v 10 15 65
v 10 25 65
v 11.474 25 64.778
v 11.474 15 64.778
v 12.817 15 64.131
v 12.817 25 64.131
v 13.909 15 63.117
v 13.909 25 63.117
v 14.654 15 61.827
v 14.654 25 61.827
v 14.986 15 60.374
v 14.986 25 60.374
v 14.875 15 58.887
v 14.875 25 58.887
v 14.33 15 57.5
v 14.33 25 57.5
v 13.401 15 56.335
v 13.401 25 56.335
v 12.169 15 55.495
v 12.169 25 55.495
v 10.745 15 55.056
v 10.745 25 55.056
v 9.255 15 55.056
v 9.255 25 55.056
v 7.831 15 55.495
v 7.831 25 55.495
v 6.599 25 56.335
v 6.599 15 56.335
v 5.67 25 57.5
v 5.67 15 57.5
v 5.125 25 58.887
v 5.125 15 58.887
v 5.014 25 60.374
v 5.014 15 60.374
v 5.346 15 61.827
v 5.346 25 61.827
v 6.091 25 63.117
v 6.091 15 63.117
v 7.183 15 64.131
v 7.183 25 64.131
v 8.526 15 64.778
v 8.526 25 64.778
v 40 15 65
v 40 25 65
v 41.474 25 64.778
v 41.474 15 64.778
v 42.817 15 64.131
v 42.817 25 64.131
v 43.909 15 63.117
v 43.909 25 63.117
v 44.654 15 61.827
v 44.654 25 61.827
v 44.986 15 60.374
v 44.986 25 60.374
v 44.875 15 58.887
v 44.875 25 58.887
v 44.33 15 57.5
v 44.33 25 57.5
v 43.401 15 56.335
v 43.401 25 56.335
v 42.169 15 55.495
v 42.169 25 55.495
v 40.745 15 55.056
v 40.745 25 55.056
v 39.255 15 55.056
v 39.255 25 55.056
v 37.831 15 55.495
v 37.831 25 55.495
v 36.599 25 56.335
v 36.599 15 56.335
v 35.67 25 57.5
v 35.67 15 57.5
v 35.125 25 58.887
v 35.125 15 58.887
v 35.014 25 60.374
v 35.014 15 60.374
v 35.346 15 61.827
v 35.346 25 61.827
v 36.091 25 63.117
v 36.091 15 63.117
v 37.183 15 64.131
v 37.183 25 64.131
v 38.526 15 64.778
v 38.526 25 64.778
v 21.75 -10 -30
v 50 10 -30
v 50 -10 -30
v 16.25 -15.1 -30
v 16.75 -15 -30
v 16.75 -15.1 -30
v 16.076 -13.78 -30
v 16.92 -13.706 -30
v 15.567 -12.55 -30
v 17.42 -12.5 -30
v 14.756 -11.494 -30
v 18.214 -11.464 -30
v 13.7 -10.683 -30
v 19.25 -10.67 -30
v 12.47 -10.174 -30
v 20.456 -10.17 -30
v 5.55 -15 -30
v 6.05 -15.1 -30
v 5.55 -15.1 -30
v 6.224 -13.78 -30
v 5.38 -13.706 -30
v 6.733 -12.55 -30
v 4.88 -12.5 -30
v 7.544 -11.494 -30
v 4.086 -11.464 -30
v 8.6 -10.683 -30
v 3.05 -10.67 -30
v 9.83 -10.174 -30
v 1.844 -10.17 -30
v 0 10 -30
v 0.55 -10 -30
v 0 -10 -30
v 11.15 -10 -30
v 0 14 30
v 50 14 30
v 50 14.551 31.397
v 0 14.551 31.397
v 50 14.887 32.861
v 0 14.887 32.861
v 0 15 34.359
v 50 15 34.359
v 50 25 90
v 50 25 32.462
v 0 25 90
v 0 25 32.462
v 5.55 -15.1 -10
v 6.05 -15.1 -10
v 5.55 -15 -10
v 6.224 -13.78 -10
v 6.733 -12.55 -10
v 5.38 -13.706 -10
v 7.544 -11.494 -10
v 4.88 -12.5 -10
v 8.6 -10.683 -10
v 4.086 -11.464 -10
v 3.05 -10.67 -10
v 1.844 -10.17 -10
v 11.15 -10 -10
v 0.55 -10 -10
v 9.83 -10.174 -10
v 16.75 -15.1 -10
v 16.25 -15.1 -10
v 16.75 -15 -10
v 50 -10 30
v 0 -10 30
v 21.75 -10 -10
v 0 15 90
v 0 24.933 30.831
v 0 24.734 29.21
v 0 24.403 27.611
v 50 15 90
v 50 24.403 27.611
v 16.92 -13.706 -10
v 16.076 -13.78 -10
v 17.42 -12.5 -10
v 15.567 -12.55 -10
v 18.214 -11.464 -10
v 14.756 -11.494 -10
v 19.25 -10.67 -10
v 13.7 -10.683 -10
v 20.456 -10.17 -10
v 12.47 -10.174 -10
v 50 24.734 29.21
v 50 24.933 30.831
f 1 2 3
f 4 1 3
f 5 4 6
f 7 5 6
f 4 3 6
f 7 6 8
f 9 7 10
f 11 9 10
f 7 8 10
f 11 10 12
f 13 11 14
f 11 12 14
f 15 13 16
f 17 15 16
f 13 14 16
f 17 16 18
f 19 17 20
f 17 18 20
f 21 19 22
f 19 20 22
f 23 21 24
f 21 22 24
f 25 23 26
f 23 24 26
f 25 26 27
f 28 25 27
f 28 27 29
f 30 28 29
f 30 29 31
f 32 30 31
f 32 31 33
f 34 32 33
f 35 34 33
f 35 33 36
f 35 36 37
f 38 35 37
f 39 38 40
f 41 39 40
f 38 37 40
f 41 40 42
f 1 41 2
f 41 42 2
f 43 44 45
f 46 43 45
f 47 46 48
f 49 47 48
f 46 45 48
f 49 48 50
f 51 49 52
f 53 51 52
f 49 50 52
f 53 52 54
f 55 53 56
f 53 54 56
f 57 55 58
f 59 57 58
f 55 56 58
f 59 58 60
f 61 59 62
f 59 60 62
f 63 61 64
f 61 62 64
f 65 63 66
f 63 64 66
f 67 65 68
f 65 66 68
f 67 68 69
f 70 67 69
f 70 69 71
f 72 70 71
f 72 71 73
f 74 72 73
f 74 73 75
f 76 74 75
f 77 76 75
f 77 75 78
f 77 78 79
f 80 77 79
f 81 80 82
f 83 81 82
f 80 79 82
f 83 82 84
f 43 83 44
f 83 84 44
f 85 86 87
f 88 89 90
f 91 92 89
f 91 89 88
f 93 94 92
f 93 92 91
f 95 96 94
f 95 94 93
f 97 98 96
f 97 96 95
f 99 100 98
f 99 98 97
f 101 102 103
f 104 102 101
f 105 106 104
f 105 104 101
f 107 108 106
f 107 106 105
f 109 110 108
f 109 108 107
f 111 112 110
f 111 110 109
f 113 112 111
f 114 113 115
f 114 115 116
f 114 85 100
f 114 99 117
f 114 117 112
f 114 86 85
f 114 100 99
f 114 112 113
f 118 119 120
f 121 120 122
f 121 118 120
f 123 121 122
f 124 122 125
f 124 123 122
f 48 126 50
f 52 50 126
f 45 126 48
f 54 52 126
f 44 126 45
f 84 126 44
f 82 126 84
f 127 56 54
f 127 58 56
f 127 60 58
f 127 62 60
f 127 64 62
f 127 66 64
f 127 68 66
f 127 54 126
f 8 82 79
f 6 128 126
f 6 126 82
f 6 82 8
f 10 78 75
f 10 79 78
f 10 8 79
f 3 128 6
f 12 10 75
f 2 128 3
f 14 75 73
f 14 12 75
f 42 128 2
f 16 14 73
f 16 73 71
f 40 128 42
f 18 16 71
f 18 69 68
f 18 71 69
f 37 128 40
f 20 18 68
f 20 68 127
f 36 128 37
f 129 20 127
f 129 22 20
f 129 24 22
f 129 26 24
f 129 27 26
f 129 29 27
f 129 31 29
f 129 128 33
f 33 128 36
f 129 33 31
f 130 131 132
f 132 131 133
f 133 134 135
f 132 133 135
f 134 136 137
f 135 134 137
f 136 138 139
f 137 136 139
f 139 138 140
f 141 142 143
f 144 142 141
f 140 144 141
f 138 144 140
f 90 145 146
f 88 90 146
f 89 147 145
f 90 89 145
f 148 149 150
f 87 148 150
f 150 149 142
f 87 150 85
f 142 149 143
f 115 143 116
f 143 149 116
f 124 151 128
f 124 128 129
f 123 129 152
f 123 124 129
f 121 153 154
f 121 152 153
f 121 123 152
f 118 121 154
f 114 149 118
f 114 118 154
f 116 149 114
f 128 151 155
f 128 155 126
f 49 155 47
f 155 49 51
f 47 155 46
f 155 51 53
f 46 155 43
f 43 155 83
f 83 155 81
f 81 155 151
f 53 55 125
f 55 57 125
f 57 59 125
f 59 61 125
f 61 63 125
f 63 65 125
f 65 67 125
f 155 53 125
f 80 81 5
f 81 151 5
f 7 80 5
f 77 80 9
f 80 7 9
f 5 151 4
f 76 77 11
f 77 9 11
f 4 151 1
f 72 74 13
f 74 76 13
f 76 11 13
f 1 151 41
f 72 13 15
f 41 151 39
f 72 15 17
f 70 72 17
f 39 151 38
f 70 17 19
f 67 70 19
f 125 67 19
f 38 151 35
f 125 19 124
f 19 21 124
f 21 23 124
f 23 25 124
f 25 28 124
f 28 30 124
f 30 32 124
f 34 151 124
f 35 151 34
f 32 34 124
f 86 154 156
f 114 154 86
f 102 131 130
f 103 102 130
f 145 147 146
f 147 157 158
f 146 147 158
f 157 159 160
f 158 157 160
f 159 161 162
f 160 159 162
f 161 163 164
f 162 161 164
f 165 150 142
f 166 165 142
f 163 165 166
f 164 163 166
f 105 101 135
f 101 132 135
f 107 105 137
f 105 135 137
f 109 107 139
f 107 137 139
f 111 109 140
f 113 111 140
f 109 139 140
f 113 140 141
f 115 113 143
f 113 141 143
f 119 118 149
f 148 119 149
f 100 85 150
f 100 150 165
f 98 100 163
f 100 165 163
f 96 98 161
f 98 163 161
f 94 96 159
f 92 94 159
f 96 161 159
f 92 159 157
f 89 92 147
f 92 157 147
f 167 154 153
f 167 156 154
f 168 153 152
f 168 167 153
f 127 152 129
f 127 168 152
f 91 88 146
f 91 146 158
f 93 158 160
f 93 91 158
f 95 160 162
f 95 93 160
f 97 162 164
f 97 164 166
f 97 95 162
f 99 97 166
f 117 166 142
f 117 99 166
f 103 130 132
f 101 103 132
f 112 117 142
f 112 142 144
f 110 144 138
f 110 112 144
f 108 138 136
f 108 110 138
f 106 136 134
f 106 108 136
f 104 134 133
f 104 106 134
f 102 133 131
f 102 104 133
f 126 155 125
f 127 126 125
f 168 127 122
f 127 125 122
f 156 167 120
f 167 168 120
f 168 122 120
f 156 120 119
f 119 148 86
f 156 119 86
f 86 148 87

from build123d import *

# Parameters (mm, degrees)
SKETCH1_W           = 60
SKETCH1_H           = 20
SKETCH1_H_2         = 10
BOSS_EXTRUDE1_DEPTH = 50
FILLET1_R           = 20
BOSS_EXTRUDE2_DEPTH = 50
FILLET2_R           = 10
BOSS_EXTRUDE3_DEPTH = 20
FILLET3_R           = 5
SKETCH4_R           = 5
CUT_EXTRUDE1_DEPTH  = 10


with BuildPart() as part:
    # Sketch1 → Boss-Extrude1 (new body)
    with BuildSketch(Plane(origin=(0, 0, 0), x_dir=(0, 0, -1), z_dir=(1, 0, 0))):
        Rectangle(SKETCH1_W, SKETCH1_H)
        Polygon((-30, 25), (30, 10), (-30, 10), align=None)
        with Locations((-60, 20)):
            Rectangle(SKETCH1_W, SKETCH1_H_2)
    extrude(amount=BOSS_EXTRUDE1_DEPTH)

    # Fillet1
    fillet1_edges = [part.edges().sort_by_distance(p)[0] for p in [
        (25, 25, 30),
    ]]
    fillet(fillet1_edges, radius=FILLET1_R)

    # Sketch2 → Boss-Extrude2 (add)
    with BuildSketch(Plane.ZY):
        Polygon((30, 15), (30, 14), (31, 15), align=None)
    extrude(amount=-BOSS_EXTRUDE2_DEPTH)

    # Fillet2
    # the kernel refuses this fillet: 10 mm, written as the material it adds along each edge
    with BuildSketch(Plane(origin=(0, 15, 31), x_dir=(0, 0, 1), z_dir=(1, 0, 0))) as fillet2_piece_1:
        with BuildLine():
            CenterArc((3.358898944, 10), FILLET2_R, 244.158067237, 25.841932763)
            Line((-1, 1), (-1.087177979, 0.82))
            ThreePointArc((-1.087177979, 0.82), (-0.641421356, 0.358578644), (-0.141421356, -0.141421356))
            Line((-0.141421356, -0.141421356), (0, -0.2))
            Line((0, -0.2), (3.358898944, -0.2))
            Line((3.358898944, -0.2), (3.358898944, 0))
        make_face()
    extrude(amount=50)

    # Sketch3 → Boss-Extrude3 (add)
    with BuildSketch(Plane(origin=(0, 0, -30), x_dir=(-1, 0, 0), z_dir=(0, 0, -1))):
        with BuildLine():
            Line((-5.55, -10), (-11.149999969, -10))
            ThreePointArc((-11.149999969, -10), (-7.543755405, -11.493755427), (-6.05, -15.1))
            Line((-6.05, -15.1), (-5.55, -15.1))
            Line((-5.55, -15.1), (-5.55, -10))
        make_face()
        with BuildLine():
            Line((-16.75, -15.1), (-16.25, -15.1))
            ThreePointArc((-16.25, -15.1), (-14.756244573, -11.493755405), (-11.149999969, -10))
            Line((-11.149999969, -10), (-16.75, -10))
            Line((-16.75, -10), (-16.75, -15.1))
        make_face()
    extrude(amount=-BOSS_EXTRUDE3_DEPTH)

    # Fillet3
    fillet3_edges = [part.edges().sort_by_distance(p)[0] for p in [
        (5.55, -10, -20),
        (16.75, -10, -20),
    ]]
    fillet(fillet3_edges, radius=FILLET3_R)

    # Sketch4 → Cut-Extrude1 (cut)
    with BuildSketch(Plane(origin=(0, 25, 0), x_dir=(1, 0, 0), z_dir=(0, 1, 0))):
        with Locations(Location((10, -60, 0), (0, 0, 270))):
            Circle(SKETCH4_R)
        with Locations(Location((40, -60, 0), (0, 0, 270))):
            Circle(SKETCH4_R)
    extrude(amount=-CUT_EXTRUDE1_DEPTH, mode=Mode.SUBTRACT)


solid = part.part
